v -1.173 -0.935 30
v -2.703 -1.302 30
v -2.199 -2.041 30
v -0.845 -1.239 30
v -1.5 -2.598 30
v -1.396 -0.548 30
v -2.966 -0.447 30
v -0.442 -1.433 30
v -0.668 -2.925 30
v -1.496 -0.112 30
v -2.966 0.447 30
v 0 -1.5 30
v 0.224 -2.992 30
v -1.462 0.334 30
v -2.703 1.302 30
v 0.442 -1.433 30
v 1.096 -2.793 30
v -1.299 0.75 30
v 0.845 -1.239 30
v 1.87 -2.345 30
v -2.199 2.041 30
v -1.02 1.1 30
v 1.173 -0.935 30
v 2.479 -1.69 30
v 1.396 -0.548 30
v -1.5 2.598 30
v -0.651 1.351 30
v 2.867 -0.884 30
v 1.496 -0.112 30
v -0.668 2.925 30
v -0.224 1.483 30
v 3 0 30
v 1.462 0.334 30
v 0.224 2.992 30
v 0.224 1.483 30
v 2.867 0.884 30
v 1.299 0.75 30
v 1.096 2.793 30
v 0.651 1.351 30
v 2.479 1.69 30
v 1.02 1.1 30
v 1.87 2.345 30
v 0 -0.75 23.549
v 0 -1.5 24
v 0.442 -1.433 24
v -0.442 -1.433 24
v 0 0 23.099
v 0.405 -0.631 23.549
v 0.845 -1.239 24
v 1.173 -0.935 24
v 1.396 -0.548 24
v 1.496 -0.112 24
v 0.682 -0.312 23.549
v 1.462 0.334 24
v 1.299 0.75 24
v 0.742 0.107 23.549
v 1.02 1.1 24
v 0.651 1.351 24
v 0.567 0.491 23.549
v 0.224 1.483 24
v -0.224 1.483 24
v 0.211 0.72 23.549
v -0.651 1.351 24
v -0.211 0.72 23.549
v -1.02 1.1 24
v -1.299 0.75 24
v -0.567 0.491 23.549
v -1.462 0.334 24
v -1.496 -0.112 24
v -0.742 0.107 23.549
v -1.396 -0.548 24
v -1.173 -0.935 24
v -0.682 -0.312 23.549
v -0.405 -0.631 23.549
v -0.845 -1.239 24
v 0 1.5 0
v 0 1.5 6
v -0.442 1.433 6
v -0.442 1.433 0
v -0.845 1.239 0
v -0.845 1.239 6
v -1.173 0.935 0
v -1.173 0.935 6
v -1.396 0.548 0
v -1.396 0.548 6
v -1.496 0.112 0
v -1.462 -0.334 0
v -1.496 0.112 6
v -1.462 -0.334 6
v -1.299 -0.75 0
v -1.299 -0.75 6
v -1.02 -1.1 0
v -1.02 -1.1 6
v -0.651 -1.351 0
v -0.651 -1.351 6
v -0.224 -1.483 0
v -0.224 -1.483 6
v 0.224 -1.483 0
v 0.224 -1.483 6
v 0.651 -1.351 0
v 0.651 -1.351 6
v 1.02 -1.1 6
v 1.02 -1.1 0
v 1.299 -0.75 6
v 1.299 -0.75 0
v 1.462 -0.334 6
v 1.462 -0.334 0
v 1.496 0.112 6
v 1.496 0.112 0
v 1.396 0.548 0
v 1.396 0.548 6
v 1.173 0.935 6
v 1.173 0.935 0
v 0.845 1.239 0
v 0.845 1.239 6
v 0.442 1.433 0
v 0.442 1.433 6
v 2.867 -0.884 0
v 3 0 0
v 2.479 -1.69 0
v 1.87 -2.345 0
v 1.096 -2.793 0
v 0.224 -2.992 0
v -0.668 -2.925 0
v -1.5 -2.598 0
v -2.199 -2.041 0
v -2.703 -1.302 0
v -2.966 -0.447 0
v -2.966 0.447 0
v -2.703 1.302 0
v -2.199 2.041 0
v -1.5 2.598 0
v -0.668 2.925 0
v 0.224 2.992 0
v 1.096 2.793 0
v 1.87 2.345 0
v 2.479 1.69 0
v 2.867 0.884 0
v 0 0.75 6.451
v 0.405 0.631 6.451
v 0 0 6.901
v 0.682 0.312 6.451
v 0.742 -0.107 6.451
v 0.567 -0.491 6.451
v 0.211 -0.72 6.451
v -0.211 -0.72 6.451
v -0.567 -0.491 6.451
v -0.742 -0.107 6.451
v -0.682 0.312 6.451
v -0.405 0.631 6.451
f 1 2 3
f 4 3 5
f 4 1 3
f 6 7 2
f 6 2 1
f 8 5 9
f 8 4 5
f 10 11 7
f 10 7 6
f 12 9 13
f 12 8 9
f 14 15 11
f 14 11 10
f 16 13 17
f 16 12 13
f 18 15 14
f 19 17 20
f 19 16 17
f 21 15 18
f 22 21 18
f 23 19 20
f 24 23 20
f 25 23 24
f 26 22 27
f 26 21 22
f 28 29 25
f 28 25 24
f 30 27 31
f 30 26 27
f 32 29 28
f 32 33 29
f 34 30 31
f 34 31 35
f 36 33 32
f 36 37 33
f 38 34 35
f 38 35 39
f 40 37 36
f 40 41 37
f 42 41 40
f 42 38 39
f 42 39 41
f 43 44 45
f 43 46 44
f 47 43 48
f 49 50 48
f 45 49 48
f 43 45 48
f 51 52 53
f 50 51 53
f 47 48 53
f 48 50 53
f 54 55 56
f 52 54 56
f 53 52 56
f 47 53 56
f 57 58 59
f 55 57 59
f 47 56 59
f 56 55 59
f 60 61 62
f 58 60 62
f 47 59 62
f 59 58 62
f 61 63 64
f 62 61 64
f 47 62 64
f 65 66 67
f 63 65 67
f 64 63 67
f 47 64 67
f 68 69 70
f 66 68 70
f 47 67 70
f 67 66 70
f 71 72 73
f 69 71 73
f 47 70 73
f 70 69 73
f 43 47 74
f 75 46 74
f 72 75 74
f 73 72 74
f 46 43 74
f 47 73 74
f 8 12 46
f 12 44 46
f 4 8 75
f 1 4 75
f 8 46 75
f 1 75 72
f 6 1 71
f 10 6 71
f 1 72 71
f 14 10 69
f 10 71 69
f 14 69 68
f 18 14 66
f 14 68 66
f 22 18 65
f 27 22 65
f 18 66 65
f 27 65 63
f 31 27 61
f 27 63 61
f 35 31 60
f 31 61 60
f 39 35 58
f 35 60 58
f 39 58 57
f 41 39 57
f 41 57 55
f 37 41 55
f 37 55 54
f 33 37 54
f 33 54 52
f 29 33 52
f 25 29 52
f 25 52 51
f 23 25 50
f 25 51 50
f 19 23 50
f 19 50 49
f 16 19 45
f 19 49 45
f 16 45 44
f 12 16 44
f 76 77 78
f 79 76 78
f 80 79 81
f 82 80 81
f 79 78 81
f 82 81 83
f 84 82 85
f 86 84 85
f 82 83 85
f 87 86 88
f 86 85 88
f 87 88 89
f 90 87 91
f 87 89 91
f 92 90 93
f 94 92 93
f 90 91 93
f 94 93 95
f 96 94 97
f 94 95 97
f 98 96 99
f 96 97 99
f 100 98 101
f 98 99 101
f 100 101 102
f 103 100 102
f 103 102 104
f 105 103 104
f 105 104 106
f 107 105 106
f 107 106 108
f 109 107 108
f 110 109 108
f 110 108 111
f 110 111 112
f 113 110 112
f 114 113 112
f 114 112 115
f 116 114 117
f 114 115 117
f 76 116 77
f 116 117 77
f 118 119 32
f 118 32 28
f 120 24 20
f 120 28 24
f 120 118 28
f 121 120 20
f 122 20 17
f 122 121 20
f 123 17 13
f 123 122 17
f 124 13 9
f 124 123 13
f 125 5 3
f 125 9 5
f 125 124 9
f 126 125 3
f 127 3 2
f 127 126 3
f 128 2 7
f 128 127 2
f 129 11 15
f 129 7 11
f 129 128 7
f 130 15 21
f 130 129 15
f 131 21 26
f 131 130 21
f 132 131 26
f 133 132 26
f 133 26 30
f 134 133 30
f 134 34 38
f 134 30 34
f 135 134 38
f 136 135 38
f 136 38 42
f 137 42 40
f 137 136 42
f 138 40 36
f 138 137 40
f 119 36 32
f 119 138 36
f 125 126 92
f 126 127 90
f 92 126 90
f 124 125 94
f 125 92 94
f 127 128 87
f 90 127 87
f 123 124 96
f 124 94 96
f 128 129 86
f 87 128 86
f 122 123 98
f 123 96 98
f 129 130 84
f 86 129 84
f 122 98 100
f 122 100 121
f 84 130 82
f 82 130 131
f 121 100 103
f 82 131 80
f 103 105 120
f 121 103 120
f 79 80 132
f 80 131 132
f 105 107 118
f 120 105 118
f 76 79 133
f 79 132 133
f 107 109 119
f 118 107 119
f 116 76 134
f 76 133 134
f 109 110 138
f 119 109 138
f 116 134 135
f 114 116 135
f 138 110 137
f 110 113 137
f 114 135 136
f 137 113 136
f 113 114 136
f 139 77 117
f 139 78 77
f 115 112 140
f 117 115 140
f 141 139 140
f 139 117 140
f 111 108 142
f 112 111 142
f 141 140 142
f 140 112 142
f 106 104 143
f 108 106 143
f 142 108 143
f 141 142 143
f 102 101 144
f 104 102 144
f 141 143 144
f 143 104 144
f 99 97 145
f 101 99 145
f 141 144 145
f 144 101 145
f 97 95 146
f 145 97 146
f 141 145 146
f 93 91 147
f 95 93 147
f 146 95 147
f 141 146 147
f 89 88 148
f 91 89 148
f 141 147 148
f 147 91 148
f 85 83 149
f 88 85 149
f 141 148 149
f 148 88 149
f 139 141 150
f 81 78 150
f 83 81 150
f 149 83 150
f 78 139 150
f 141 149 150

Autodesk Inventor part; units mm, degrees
ref_plane "YZ Plane" through (0, 0, 0) normal (1, 0, 0) x (0, 1, 0)
ref_plane "XZ Plane" through (0, 0, 0) normal (0, 1, 0) x (-1, 0, 0)
ref_plane "XY Plane" through (0, 0, 0) normal (0, 0, 1) x (1, 0, 0)
sketch "スケッチ1" plane through (0, 0, 0) normal (0, 0, 1) x (1, 0, 0)
  circle A0 centre (0, 0) radius 3
  dimension "d0" = 6
extrude "押し出し1" add sketch "スケッチ1" along normal blind 30
hole "穴1" at (0, 0, 0) direction (0, 0, 1) diameter 3 depth 6 tip angle 118
sketch "スケッチ2" plane through (0, 0, 30) normal (0, 0, 1) x (1, 0, 0)
  circle A0 centre (0, 0) radius 3 projected
hole "穴2" at (0, 0, 30) direction (0, 0, -1) diameter 3 depth 6 tip angle 118
properties part number "スペーサ　m3-l30" material "アルミニウム 2014-T4"
